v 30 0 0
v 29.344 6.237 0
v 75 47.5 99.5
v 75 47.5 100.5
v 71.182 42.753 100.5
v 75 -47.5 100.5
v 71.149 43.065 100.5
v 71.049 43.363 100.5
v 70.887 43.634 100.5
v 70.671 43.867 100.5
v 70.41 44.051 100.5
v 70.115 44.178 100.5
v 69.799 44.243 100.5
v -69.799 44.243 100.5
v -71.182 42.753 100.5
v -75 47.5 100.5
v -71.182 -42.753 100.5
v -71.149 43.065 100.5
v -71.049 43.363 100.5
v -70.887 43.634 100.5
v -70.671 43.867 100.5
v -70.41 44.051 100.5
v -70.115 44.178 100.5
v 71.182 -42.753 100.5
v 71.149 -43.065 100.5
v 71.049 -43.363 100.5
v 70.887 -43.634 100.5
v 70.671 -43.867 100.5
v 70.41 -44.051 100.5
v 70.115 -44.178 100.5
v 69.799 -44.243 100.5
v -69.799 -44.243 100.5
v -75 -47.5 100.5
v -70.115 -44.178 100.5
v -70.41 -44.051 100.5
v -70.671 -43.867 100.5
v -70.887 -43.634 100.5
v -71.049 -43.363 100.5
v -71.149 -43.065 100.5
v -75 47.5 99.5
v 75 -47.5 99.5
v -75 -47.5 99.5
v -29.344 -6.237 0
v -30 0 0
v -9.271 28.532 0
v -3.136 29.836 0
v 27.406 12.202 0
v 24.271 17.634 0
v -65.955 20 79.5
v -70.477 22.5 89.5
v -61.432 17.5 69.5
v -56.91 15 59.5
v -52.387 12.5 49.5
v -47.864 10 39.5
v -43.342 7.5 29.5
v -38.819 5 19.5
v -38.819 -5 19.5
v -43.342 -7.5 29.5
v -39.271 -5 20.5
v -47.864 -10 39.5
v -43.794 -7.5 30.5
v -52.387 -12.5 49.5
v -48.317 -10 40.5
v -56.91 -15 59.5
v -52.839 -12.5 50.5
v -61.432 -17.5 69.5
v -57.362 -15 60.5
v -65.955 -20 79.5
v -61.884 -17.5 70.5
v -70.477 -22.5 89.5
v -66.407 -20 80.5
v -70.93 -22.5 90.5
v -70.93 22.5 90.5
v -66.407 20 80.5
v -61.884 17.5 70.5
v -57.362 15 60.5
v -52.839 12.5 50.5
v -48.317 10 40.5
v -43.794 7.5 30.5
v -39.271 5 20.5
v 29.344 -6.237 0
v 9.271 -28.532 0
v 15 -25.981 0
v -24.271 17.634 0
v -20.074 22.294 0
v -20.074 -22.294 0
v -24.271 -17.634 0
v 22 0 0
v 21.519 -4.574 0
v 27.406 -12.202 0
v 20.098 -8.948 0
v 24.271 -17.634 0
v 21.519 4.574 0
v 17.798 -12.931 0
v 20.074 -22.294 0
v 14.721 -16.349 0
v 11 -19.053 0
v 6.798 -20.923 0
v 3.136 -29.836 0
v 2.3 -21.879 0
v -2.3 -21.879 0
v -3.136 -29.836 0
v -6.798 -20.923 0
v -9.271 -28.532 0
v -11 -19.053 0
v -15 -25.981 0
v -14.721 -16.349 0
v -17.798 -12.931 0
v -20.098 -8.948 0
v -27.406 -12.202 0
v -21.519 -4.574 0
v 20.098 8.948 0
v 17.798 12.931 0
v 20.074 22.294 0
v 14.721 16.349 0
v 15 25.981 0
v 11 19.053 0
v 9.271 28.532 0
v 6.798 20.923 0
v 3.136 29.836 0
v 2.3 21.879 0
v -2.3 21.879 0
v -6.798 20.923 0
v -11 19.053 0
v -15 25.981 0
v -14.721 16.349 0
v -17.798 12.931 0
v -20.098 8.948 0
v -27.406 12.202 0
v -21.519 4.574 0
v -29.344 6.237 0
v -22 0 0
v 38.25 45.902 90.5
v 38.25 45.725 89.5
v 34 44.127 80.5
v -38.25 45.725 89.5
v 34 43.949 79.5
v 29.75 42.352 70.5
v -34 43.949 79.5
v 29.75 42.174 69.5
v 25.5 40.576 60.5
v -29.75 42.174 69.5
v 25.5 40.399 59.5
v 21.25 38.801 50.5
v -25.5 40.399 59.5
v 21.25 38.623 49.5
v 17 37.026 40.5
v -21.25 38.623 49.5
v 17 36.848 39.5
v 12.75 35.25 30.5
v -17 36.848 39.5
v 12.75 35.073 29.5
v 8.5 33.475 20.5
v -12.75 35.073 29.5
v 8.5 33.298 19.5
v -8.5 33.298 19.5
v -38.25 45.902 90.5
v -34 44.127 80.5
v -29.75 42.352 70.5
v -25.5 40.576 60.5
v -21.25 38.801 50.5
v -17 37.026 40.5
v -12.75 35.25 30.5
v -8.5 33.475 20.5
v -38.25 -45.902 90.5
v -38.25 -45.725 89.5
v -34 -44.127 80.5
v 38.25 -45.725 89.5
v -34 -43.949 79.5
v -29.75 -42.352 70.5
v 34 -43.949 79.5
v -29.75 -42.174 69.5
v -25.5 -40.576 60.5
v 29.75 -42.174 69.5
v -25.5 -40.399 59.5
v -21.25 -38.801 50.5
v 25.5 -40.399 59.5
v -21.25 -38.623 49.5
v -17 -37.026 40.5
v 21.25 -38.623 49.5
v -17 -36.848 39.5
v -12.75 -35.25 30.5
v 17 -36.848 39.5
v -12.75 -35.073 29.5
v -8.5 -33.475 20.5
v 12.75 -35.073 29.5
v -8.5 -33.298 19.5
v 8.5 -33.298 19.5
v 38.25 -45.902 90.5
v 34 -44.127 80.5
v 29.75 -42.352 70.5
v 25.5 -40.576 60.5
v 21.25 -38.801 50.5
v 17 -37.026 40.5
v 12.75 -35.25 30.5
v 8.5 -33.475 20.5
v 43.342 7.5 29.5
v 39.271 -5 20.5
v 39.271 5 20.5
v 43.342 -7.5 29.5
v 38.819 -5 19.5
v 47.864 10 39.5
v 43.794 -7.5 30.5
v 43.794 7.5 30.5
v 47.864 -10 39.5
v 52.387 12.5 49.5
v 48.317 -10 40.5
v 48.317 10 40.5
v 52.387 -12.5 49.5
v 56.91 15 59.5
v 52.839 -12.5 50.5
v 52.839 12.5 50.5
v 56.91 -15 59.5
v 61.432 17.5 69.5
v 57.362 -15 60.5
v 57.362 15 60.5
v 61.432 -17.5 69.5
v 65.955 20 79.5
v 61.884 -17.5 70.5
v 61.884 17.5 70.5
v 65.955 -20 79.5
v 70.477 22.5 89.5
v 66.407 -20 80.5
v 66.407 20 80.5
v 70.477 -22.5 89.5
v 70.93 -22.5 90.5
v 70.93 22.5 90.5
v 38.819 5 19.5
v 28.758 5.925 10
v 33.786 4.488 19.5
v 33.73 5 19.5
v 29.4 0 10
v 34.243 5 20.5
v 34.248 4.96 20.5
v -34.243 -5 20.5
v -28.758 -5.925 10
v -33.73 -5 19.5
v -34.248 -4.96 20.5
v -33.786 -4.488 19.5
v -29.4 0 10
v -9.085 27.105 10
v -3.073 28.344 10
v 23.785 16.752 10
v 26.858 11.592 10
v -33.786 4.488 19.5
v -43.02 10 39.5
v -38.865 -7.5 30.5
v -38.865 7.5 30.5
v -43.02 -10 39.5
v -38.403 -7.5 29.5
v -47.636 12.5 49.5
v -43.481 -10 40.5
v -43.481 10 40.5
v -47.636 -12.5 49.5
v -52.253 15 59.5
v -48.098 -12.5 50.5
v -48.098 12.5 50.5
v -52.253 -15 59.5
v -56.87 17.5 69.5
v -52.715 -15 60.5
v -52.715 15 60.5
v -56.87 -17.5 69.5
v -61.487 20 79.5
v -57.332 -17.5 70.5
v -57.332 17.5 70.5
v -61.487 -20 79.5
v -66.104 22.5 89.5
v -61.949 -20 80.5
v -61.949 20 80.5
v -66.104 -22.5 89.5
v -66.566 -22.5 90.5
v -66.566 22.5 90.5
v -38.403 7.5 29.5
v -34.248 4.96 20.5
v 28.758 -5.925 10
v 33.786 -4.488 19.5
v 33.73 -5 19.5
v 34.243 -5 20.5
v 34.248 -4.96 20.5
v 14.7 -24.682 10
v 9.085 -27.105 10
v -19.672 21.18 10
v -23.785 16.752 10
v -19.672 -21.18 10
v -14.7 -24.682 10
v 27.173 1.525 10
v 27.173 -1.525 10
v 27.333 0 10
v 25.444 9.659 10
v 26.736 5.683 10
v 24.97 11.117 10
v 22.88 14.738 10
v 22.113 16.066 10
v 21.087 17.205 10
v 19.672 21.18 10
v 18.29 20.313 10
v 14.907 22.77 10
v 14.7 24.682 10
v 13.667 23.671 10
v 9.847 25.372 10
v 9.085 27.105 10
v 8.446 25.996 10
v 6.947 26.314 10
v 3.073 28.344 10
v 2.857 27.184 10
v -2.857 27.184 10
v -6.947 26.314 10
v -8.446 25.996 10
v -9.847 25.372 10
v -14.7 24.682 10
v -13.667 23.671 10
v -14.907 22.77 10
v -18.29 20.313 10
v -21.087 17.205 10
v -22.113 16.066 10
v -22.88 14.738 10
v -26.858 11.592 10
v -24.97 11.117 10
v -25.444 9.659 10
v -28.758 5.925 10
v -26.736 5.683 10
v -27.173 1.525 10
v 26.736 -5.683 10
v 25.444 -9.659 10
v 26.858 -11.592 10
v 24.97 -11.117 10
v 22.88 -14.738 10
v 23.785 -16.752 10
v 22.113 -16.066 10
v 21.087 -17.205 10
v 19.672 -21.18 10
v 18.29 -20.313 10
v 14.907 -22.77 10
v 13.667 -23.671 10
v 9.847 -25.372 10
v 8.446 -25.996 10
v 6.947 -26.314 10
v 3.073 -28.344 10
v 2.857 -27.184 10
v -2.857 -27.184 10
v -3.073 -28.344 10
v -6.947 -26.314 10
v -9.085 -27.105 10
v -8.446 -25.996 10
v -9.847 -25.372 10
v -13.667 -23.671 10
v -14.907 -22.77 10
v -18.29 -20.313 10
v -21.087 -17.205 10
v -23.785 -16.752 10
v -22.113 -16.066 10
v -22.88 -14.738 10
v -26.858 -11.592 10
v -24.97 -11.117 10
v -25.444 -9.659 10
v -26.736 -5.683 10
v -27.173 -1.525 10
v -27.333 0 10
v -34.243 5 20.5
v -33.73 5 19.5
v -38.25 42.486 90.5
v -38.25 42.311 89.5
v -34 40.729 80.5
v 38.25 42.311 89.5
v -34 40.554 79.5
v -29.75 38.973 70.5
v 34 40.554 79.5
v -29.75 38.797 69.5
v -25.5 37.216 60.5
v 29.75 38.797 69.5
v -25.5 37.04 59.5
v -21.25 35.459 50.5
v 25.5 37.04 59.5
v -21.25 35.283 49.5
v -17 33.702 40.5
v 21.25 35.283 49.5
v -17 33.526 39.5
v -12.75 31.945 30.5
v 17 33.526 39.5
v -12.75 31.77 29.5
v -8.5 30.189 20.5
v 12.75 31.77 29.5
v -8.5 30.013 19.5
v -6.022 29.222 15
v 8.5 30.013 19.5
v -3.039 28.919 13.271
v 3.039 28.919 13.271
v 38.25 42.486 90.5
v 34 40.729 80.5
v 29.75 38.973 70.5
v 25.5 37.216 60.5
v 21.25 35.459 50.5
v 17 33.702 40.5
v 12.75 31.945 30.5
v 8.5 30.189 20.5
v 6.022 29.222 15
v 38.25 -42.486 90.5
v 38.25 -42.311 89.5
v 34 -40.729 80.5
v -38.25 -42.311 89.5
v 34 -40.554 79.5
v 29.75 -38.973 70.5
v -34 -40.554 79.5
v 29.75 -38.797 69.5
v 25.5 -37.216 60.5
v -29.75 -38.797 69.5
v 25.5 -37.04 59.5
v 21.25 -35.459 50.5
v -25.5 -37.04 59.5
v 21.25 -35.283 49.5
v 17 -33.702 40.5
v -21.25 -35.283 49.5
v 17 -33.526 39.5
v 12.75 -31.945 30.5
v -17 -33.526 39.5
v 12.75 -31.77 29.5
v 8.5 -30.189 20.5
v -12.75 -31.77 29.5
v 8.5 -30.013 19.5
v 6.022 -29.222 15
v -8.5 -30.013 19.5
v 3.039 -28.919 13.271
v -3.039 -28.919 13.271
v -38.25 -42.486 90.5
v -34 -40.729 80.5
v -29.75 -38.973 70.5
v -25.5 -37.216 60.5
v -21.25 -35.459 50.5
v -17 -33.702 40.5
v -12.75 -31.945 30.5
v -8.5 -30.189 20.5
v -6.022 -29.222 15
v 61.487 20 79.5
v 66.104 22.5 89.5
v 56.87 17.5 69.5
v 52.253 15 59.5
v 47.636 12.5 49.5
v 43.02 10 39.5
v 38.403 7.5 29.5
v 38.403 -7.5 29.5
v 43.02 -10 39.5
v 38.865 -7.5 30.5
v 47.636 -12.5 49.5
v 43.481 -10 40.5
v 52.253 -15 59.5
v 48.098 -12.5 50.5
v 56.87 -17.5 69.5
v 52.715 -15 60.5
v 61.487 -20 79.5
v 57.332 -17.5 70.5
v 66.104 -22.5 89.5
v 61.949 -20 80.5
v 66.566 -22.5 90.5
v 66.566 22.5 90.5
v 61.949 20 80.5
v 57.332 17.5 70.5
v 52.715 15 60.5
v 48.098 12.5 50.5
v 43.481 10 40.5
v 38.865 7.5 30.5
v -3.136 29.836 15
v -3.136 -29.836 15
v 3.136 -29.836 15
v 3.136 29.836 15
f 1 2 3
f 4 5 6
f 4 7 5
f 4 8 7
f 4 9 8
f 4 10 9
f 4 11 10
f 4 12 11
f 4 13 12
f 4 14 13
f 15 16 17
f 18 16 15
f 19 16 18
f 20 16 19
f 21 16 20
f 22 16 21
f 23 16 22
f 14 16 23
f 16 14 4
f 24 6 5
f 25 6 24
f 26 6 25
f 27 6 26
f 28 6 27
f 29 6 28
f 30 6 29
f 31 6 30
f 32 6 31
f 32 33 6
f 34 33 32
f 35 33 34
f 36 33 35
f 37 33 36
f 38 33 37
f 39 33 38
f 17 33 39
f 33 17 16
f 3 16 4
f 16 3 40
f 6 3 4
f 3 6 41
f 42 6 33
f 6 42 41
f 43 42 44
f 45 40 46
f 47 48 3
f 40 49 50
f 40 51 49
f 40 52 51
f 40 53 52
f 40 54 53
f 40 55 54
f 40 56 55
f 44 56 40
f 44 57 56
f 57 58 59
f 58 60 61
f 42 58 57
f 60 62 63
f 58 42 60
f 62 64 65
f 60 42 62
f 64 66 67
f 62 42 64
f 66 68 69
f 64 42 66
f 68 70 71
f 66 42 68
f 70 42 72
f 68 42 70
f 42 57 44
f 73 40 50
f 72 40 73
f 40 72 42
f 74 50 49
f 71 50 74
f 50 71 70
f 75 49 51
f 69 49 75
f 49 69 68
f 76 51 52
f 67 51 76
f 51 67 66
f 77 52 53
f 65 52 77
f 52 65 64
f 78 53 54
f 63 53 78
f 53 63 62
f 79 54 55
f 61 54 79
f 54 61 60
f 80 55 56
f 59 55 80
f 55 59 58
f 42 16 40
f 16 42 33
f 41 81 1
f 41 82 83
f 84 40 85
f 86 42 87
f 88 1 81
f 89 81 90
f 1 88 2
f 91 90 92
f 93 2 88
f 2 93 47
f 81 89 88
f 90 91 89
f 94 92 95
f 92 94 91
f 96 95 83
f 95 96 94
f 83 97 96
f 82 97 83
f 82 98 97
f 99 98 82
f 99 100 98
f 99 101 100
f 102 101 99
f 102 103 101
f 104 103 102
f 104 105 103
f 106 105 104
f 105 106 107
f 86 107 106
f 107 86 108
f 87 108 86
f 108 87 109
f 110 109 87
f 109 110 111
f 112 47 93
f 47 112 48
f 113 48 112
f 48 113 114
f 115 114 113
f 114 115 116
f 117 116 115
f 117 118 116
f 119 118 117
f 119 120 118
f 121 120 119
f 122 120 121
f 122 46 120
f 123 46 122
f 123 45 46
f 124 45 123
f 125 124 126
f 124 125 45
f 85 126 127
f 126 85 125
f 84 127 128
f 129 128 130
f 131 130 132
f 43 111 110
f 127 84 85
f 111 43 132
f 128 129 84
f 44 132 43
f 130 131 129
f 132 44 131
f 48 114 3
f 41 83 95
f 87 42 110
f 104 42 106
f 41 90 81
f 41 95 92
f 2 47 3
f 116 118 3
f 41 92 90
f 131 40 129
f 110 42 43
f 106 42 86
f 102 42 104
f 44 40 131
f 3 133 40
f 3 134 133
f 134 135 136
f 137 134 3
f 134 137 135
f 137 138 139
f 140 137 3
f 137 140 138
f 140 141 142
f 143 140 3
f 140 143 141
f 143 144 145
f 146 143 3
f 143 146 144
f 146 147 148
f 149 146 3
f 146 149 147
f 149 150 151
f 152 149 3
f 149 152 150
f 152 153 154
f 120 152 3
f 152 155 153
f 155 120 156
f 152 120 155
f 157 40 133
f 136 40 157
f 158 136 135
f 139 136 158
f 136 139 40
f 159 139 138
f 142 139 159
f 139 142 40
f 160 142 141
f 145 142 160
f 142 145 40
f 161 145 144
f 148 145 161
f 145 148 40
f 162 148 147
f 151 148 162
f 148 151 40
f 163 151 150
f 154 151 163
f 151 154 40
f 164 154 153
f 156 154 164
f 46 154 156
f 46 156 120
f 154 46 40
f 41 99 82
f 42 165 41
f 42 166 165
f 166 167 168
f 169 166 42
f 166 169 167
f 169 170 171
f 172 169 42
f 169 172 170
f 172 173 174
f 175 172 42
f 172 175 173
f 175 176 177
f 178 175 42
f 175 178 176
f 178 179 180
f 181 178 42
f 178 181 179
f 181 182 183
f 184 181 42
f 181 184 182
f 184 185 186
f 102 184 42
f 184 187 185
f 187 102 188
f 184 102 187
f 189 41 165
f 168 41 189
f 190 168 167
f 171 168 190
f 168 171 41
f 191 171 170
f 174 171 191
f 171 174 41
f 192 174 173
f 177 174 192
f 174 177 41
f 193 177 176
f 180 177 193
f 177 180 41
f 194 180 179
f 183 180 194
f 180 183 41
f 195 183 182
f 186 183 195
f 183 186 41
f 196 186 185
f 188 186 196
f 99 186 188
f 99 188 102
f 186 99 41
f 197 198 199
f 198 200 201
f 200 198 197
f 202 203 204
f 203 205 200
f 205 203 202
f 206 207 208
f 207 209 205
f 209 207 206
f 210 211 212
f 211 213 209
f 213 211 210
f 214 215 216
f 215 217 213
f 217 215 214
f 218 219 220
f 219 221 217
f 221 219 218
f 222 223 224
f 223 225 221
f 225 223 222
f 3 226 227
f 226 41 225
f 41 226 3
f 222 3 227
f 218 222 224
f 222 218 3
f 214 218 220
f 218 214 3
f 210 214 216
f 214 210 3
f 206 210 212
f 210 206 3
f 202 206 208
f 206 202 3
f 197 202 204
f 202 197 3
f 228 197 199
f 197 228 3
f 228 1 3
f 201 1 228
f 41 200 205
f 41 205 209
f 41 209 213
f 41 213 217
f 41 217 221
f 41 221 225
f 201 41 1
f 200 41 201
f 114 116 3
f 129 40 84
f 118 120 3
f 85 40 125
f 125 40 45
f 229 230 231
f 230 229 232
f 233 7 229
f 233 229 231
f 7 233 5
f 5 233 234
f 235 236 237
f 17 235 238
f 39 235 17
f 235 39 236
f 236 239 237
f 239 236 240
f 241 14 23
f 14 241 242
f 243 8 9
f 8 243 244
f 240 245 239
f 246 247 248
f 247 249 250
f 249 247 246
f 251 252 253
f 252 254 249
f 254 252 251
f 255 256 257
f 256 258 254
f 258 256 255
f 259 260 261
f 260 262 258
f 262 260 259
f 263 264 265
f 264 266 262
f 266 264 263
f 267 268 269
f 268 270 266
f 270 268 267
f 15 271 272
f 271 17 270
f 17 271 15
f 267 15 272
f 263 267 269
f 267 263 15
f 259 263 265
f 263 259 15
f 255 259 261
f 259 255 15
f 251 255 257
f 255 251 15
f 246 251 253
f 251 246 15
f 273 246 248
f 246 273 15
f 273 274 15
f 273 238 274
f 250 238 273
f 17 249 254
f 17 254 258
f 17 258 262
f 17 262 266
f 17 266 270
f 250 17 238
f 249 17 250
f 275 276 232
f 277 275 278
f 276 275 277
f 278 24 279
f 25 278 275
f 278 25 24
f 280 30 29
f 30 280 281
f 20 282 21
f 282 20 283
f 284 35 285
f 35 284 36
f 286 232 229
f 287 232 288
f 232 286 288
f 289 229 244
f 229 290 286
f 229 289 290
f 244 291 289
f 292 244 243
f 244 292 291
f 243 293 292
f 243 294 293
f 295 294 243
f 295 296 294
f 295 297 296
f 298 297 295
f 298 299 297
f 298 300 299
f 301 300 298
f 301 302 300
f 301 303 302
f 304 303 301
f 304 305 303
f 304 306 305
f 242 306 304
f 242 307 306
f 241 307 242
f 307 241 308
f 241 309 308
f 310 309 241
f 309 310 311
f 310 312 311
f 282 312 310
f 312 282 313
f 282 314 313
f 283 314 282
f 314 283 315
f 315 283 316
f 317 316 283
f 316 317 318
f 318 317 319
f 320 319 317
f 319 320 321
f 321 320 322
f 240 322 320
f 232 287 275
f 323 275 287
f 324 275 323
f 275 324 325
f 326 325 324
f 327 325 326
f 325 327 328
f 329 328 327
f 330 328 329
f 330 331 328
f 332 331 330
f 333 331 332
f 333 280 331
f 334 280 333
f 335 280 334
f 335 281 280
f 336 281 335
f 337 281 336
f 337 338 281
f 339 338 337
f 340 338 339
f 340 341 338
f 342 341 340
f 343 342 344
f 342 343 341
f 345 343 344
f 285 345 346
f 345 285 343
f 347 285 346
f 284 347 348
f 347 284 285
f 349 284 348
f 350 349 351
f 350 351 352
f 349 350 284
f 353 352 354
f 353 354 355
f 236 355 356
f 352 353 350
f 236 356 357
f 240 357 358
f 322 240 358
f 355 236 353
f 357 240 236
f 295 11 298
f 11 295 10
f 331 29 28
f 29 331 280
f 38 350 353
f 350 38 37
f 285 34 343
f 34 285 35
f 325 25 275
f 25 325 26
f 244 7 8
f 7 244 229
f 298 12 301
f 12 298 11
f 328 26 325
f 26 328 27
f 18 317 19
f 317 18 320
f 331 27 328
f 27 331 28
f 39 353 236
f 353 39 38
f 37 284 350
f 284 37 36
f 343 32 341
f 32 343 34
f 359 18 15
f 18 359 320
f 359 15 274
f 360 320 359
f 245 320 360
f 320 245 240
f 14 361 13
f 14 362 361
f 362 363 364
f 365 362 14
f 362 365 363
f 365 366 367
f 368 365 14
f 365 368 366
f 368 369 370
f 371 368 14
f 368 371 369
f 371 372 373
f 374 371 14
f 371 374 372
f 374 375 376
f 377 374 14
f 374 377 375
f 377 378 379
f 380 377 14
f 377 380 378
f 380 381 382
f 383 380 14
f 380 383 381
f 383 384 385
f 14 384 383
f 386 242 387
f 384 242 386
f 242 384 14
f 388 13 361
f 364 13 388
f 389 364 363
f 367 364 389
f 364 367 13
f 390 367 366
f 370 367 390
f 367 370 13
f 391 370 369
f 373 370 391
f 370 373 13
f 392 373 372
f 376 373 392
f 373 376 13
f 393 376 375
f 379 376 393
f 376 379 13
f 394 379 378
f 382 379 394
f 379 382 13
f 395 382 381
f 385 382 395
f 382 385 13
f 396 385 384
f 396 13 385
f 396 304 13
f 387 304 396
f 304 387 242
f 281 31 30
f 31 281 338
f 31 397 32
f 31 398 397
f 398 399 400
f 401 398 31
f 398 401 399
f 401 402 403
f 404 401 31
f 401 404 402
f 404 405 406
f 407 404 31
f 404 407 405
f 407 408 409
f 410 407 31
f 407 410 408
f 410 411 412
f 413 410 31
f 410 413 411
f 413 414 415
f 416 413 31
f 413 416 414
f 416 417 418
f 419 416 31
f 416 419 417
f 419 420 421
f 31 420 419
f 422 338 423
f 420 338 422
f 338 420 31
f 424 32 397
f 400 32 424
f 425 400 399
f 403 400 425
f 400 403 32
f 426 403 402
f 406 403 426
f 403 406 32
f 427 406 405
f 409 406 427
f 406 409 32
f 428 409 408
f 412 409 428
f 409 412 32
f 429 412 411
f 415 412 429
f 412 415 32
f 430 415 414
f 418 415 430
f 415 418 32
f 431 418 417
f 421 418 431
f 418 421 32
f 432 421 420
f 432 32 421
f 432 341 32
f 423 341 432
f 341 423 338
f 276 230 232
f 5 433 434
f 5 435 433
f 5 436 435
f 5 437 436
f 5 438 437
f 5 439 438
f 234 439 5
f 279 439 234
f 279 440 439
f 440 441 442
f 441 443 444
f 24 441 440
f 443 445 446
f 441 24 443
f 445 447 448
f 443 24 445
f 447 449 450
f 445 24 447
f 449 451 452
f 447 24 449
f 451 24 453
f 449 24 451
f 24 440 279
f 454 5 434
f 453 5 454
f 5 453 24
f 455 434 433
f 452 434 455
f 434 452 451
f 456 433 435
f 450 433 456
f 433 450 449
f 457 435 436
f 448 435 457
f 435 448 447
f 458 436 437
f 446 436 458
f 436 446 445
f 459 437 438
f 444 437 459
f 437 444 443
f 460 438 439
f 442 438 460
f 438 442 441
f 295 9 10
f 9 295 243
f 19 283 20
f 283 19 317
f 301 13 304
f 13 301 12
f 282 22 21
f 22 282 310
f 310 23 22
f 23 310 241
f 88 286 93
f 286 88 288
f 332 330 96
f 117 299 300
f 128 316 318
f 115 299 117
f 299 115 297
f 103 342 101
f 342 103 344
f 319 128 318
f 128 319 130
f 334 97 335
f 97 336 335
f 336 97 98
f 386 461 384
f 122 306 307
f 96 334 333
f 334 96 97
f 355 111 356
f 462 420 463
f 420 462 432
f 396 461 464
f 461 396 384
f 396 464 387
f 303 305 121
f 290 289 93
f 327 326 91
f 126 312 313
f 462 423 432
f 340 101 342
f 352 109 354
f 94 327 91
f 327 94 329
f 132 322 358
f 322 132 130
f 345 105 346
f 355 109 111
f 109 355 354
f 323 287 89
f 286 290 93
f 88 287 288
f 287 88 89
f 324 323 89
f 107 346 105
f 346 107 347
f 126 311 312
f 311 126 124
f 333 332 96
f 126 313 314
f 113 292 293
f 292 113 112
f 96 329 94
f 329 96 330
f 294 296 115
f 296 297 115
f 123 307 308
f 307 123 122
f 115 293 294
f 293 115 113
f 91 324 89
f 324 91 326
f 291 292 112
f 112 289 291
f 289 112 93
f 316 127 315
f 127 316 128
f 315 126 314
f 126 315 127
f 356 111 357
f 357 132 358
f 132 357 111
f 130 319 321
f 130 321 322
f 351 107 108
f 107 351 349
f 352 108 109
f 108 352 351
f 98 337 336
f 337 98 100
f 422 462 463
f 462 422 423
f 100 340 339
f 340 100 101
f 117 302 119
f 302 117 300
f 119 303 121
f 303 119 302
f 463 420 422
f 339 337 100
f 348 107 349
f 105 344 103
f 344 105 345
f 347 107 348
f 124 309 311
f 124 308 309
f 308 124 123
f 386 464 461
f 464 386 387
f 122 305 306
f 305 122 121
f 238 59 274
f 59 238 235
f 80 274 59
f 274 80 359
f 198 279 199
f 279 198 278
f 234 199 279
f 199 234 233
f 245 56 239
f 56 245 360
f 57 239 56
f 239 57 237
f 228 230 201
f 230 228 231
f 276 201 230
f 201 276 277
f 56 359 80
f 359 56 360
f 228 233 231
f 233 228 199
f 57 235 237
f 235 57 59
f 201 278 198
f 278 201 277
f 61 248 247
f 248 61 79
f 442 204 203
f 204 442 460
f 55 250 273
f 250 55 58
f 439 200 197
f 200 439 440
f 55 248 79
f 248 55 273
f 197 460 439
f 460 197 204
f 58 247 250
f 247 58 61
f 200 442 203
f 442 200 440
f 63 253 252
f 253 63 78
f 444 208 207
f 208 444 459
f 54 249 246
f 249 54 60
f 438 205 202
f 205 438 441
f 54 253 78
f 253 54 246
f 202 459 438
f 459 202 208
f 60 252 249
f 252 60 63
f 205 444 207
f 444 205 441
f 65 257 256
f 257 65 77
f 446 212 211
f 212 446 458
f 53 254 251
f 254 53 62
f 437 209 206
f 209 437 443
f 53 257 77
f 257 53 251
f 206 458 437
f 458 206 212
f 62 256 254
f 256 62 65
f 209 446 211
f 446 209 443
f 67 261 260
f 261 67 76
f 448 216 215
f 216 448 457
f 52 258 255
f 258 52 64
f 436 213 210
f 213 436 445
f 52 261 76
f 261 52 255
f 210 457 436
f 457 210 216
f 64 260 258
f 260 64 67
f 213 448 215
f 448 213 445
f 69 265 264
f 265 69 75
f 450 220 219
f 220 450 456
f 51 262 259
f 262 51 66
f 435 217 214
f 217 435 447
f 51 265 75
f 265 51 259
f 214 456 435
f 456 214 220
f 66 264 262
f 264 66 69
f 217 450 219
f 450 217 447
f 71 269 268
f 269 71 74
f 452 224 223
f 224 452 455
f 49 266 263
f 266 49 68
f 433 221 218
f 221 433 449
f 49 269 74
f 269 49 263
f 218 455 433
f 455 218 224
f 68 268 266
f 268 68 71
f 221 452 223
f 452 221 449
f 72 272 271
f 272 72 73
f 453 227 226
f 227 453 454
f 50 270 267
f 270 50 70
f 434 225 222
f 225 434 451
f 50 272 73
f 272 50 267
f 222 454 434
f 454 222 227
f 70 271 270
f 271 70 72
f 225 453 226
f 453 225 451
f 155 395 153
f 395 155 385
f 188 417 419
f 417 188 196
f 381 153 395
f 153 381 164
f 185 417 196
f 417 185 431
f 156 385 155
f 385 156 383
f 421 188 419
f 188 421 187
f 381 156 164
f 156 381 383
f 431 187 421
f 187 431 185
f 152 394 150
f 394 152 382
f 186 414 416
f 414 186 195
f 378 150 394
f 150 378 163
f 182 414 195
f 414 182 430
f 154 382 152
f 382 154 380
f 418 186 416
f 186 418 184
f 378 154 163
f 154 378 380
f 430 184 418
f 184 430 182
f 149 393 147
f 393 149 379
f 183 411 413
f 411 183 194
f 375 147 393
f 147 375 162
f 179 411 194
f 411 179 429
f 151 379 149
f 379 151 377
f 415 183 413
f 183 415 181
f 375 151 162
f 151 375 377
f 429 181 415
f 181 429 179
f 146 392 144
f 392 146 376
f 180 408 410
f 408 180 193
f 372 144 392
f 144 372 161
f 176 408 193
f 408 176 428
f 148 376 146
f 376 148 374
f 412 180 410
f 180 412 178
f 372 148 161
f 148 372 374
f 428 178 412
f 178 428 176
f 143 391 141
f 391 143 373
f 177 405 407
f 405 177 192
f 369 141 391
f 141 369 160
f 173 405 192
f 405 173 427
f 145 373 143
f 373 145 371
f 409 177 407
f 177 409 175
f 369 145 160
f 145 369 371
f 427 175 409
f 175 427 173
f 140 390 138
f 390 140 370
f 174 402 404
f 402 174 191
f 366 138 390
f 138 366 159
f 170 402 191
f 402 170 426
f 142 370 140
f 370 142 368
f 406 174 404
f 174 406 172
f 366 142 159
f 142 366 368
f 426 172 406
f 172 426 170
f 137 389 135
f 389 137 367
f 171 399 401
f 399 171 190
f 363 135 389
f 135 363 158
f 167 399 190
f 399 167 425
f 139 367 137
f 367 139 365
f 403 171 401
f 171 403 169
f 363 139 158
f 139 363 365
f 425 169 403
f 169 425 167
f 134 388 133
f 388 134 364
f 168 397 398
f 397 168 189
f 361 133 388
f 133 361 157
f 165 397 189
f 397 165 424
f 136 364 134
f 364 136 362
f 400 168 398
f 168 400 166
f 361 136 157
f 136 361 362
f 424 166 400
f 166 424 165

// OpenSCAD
module form(){ hull(){
cylinder(50,30,30);


translate([0,0,100]) cube([150,95,1],true);
}
}
difference(){
difference()
{


form();
  
translate([0,0,10]) scale([0.98,0.95,0.96]) form();
cylinder(15,22,30);
    
}
for(i = [10:5:45]){
translate([0,0,2*i]) cube([150,i,1], true);
}
for(i = [10:5:45]){
translate([0,0,2*i]) cube([1.7*i,120,1], true);
}
}
